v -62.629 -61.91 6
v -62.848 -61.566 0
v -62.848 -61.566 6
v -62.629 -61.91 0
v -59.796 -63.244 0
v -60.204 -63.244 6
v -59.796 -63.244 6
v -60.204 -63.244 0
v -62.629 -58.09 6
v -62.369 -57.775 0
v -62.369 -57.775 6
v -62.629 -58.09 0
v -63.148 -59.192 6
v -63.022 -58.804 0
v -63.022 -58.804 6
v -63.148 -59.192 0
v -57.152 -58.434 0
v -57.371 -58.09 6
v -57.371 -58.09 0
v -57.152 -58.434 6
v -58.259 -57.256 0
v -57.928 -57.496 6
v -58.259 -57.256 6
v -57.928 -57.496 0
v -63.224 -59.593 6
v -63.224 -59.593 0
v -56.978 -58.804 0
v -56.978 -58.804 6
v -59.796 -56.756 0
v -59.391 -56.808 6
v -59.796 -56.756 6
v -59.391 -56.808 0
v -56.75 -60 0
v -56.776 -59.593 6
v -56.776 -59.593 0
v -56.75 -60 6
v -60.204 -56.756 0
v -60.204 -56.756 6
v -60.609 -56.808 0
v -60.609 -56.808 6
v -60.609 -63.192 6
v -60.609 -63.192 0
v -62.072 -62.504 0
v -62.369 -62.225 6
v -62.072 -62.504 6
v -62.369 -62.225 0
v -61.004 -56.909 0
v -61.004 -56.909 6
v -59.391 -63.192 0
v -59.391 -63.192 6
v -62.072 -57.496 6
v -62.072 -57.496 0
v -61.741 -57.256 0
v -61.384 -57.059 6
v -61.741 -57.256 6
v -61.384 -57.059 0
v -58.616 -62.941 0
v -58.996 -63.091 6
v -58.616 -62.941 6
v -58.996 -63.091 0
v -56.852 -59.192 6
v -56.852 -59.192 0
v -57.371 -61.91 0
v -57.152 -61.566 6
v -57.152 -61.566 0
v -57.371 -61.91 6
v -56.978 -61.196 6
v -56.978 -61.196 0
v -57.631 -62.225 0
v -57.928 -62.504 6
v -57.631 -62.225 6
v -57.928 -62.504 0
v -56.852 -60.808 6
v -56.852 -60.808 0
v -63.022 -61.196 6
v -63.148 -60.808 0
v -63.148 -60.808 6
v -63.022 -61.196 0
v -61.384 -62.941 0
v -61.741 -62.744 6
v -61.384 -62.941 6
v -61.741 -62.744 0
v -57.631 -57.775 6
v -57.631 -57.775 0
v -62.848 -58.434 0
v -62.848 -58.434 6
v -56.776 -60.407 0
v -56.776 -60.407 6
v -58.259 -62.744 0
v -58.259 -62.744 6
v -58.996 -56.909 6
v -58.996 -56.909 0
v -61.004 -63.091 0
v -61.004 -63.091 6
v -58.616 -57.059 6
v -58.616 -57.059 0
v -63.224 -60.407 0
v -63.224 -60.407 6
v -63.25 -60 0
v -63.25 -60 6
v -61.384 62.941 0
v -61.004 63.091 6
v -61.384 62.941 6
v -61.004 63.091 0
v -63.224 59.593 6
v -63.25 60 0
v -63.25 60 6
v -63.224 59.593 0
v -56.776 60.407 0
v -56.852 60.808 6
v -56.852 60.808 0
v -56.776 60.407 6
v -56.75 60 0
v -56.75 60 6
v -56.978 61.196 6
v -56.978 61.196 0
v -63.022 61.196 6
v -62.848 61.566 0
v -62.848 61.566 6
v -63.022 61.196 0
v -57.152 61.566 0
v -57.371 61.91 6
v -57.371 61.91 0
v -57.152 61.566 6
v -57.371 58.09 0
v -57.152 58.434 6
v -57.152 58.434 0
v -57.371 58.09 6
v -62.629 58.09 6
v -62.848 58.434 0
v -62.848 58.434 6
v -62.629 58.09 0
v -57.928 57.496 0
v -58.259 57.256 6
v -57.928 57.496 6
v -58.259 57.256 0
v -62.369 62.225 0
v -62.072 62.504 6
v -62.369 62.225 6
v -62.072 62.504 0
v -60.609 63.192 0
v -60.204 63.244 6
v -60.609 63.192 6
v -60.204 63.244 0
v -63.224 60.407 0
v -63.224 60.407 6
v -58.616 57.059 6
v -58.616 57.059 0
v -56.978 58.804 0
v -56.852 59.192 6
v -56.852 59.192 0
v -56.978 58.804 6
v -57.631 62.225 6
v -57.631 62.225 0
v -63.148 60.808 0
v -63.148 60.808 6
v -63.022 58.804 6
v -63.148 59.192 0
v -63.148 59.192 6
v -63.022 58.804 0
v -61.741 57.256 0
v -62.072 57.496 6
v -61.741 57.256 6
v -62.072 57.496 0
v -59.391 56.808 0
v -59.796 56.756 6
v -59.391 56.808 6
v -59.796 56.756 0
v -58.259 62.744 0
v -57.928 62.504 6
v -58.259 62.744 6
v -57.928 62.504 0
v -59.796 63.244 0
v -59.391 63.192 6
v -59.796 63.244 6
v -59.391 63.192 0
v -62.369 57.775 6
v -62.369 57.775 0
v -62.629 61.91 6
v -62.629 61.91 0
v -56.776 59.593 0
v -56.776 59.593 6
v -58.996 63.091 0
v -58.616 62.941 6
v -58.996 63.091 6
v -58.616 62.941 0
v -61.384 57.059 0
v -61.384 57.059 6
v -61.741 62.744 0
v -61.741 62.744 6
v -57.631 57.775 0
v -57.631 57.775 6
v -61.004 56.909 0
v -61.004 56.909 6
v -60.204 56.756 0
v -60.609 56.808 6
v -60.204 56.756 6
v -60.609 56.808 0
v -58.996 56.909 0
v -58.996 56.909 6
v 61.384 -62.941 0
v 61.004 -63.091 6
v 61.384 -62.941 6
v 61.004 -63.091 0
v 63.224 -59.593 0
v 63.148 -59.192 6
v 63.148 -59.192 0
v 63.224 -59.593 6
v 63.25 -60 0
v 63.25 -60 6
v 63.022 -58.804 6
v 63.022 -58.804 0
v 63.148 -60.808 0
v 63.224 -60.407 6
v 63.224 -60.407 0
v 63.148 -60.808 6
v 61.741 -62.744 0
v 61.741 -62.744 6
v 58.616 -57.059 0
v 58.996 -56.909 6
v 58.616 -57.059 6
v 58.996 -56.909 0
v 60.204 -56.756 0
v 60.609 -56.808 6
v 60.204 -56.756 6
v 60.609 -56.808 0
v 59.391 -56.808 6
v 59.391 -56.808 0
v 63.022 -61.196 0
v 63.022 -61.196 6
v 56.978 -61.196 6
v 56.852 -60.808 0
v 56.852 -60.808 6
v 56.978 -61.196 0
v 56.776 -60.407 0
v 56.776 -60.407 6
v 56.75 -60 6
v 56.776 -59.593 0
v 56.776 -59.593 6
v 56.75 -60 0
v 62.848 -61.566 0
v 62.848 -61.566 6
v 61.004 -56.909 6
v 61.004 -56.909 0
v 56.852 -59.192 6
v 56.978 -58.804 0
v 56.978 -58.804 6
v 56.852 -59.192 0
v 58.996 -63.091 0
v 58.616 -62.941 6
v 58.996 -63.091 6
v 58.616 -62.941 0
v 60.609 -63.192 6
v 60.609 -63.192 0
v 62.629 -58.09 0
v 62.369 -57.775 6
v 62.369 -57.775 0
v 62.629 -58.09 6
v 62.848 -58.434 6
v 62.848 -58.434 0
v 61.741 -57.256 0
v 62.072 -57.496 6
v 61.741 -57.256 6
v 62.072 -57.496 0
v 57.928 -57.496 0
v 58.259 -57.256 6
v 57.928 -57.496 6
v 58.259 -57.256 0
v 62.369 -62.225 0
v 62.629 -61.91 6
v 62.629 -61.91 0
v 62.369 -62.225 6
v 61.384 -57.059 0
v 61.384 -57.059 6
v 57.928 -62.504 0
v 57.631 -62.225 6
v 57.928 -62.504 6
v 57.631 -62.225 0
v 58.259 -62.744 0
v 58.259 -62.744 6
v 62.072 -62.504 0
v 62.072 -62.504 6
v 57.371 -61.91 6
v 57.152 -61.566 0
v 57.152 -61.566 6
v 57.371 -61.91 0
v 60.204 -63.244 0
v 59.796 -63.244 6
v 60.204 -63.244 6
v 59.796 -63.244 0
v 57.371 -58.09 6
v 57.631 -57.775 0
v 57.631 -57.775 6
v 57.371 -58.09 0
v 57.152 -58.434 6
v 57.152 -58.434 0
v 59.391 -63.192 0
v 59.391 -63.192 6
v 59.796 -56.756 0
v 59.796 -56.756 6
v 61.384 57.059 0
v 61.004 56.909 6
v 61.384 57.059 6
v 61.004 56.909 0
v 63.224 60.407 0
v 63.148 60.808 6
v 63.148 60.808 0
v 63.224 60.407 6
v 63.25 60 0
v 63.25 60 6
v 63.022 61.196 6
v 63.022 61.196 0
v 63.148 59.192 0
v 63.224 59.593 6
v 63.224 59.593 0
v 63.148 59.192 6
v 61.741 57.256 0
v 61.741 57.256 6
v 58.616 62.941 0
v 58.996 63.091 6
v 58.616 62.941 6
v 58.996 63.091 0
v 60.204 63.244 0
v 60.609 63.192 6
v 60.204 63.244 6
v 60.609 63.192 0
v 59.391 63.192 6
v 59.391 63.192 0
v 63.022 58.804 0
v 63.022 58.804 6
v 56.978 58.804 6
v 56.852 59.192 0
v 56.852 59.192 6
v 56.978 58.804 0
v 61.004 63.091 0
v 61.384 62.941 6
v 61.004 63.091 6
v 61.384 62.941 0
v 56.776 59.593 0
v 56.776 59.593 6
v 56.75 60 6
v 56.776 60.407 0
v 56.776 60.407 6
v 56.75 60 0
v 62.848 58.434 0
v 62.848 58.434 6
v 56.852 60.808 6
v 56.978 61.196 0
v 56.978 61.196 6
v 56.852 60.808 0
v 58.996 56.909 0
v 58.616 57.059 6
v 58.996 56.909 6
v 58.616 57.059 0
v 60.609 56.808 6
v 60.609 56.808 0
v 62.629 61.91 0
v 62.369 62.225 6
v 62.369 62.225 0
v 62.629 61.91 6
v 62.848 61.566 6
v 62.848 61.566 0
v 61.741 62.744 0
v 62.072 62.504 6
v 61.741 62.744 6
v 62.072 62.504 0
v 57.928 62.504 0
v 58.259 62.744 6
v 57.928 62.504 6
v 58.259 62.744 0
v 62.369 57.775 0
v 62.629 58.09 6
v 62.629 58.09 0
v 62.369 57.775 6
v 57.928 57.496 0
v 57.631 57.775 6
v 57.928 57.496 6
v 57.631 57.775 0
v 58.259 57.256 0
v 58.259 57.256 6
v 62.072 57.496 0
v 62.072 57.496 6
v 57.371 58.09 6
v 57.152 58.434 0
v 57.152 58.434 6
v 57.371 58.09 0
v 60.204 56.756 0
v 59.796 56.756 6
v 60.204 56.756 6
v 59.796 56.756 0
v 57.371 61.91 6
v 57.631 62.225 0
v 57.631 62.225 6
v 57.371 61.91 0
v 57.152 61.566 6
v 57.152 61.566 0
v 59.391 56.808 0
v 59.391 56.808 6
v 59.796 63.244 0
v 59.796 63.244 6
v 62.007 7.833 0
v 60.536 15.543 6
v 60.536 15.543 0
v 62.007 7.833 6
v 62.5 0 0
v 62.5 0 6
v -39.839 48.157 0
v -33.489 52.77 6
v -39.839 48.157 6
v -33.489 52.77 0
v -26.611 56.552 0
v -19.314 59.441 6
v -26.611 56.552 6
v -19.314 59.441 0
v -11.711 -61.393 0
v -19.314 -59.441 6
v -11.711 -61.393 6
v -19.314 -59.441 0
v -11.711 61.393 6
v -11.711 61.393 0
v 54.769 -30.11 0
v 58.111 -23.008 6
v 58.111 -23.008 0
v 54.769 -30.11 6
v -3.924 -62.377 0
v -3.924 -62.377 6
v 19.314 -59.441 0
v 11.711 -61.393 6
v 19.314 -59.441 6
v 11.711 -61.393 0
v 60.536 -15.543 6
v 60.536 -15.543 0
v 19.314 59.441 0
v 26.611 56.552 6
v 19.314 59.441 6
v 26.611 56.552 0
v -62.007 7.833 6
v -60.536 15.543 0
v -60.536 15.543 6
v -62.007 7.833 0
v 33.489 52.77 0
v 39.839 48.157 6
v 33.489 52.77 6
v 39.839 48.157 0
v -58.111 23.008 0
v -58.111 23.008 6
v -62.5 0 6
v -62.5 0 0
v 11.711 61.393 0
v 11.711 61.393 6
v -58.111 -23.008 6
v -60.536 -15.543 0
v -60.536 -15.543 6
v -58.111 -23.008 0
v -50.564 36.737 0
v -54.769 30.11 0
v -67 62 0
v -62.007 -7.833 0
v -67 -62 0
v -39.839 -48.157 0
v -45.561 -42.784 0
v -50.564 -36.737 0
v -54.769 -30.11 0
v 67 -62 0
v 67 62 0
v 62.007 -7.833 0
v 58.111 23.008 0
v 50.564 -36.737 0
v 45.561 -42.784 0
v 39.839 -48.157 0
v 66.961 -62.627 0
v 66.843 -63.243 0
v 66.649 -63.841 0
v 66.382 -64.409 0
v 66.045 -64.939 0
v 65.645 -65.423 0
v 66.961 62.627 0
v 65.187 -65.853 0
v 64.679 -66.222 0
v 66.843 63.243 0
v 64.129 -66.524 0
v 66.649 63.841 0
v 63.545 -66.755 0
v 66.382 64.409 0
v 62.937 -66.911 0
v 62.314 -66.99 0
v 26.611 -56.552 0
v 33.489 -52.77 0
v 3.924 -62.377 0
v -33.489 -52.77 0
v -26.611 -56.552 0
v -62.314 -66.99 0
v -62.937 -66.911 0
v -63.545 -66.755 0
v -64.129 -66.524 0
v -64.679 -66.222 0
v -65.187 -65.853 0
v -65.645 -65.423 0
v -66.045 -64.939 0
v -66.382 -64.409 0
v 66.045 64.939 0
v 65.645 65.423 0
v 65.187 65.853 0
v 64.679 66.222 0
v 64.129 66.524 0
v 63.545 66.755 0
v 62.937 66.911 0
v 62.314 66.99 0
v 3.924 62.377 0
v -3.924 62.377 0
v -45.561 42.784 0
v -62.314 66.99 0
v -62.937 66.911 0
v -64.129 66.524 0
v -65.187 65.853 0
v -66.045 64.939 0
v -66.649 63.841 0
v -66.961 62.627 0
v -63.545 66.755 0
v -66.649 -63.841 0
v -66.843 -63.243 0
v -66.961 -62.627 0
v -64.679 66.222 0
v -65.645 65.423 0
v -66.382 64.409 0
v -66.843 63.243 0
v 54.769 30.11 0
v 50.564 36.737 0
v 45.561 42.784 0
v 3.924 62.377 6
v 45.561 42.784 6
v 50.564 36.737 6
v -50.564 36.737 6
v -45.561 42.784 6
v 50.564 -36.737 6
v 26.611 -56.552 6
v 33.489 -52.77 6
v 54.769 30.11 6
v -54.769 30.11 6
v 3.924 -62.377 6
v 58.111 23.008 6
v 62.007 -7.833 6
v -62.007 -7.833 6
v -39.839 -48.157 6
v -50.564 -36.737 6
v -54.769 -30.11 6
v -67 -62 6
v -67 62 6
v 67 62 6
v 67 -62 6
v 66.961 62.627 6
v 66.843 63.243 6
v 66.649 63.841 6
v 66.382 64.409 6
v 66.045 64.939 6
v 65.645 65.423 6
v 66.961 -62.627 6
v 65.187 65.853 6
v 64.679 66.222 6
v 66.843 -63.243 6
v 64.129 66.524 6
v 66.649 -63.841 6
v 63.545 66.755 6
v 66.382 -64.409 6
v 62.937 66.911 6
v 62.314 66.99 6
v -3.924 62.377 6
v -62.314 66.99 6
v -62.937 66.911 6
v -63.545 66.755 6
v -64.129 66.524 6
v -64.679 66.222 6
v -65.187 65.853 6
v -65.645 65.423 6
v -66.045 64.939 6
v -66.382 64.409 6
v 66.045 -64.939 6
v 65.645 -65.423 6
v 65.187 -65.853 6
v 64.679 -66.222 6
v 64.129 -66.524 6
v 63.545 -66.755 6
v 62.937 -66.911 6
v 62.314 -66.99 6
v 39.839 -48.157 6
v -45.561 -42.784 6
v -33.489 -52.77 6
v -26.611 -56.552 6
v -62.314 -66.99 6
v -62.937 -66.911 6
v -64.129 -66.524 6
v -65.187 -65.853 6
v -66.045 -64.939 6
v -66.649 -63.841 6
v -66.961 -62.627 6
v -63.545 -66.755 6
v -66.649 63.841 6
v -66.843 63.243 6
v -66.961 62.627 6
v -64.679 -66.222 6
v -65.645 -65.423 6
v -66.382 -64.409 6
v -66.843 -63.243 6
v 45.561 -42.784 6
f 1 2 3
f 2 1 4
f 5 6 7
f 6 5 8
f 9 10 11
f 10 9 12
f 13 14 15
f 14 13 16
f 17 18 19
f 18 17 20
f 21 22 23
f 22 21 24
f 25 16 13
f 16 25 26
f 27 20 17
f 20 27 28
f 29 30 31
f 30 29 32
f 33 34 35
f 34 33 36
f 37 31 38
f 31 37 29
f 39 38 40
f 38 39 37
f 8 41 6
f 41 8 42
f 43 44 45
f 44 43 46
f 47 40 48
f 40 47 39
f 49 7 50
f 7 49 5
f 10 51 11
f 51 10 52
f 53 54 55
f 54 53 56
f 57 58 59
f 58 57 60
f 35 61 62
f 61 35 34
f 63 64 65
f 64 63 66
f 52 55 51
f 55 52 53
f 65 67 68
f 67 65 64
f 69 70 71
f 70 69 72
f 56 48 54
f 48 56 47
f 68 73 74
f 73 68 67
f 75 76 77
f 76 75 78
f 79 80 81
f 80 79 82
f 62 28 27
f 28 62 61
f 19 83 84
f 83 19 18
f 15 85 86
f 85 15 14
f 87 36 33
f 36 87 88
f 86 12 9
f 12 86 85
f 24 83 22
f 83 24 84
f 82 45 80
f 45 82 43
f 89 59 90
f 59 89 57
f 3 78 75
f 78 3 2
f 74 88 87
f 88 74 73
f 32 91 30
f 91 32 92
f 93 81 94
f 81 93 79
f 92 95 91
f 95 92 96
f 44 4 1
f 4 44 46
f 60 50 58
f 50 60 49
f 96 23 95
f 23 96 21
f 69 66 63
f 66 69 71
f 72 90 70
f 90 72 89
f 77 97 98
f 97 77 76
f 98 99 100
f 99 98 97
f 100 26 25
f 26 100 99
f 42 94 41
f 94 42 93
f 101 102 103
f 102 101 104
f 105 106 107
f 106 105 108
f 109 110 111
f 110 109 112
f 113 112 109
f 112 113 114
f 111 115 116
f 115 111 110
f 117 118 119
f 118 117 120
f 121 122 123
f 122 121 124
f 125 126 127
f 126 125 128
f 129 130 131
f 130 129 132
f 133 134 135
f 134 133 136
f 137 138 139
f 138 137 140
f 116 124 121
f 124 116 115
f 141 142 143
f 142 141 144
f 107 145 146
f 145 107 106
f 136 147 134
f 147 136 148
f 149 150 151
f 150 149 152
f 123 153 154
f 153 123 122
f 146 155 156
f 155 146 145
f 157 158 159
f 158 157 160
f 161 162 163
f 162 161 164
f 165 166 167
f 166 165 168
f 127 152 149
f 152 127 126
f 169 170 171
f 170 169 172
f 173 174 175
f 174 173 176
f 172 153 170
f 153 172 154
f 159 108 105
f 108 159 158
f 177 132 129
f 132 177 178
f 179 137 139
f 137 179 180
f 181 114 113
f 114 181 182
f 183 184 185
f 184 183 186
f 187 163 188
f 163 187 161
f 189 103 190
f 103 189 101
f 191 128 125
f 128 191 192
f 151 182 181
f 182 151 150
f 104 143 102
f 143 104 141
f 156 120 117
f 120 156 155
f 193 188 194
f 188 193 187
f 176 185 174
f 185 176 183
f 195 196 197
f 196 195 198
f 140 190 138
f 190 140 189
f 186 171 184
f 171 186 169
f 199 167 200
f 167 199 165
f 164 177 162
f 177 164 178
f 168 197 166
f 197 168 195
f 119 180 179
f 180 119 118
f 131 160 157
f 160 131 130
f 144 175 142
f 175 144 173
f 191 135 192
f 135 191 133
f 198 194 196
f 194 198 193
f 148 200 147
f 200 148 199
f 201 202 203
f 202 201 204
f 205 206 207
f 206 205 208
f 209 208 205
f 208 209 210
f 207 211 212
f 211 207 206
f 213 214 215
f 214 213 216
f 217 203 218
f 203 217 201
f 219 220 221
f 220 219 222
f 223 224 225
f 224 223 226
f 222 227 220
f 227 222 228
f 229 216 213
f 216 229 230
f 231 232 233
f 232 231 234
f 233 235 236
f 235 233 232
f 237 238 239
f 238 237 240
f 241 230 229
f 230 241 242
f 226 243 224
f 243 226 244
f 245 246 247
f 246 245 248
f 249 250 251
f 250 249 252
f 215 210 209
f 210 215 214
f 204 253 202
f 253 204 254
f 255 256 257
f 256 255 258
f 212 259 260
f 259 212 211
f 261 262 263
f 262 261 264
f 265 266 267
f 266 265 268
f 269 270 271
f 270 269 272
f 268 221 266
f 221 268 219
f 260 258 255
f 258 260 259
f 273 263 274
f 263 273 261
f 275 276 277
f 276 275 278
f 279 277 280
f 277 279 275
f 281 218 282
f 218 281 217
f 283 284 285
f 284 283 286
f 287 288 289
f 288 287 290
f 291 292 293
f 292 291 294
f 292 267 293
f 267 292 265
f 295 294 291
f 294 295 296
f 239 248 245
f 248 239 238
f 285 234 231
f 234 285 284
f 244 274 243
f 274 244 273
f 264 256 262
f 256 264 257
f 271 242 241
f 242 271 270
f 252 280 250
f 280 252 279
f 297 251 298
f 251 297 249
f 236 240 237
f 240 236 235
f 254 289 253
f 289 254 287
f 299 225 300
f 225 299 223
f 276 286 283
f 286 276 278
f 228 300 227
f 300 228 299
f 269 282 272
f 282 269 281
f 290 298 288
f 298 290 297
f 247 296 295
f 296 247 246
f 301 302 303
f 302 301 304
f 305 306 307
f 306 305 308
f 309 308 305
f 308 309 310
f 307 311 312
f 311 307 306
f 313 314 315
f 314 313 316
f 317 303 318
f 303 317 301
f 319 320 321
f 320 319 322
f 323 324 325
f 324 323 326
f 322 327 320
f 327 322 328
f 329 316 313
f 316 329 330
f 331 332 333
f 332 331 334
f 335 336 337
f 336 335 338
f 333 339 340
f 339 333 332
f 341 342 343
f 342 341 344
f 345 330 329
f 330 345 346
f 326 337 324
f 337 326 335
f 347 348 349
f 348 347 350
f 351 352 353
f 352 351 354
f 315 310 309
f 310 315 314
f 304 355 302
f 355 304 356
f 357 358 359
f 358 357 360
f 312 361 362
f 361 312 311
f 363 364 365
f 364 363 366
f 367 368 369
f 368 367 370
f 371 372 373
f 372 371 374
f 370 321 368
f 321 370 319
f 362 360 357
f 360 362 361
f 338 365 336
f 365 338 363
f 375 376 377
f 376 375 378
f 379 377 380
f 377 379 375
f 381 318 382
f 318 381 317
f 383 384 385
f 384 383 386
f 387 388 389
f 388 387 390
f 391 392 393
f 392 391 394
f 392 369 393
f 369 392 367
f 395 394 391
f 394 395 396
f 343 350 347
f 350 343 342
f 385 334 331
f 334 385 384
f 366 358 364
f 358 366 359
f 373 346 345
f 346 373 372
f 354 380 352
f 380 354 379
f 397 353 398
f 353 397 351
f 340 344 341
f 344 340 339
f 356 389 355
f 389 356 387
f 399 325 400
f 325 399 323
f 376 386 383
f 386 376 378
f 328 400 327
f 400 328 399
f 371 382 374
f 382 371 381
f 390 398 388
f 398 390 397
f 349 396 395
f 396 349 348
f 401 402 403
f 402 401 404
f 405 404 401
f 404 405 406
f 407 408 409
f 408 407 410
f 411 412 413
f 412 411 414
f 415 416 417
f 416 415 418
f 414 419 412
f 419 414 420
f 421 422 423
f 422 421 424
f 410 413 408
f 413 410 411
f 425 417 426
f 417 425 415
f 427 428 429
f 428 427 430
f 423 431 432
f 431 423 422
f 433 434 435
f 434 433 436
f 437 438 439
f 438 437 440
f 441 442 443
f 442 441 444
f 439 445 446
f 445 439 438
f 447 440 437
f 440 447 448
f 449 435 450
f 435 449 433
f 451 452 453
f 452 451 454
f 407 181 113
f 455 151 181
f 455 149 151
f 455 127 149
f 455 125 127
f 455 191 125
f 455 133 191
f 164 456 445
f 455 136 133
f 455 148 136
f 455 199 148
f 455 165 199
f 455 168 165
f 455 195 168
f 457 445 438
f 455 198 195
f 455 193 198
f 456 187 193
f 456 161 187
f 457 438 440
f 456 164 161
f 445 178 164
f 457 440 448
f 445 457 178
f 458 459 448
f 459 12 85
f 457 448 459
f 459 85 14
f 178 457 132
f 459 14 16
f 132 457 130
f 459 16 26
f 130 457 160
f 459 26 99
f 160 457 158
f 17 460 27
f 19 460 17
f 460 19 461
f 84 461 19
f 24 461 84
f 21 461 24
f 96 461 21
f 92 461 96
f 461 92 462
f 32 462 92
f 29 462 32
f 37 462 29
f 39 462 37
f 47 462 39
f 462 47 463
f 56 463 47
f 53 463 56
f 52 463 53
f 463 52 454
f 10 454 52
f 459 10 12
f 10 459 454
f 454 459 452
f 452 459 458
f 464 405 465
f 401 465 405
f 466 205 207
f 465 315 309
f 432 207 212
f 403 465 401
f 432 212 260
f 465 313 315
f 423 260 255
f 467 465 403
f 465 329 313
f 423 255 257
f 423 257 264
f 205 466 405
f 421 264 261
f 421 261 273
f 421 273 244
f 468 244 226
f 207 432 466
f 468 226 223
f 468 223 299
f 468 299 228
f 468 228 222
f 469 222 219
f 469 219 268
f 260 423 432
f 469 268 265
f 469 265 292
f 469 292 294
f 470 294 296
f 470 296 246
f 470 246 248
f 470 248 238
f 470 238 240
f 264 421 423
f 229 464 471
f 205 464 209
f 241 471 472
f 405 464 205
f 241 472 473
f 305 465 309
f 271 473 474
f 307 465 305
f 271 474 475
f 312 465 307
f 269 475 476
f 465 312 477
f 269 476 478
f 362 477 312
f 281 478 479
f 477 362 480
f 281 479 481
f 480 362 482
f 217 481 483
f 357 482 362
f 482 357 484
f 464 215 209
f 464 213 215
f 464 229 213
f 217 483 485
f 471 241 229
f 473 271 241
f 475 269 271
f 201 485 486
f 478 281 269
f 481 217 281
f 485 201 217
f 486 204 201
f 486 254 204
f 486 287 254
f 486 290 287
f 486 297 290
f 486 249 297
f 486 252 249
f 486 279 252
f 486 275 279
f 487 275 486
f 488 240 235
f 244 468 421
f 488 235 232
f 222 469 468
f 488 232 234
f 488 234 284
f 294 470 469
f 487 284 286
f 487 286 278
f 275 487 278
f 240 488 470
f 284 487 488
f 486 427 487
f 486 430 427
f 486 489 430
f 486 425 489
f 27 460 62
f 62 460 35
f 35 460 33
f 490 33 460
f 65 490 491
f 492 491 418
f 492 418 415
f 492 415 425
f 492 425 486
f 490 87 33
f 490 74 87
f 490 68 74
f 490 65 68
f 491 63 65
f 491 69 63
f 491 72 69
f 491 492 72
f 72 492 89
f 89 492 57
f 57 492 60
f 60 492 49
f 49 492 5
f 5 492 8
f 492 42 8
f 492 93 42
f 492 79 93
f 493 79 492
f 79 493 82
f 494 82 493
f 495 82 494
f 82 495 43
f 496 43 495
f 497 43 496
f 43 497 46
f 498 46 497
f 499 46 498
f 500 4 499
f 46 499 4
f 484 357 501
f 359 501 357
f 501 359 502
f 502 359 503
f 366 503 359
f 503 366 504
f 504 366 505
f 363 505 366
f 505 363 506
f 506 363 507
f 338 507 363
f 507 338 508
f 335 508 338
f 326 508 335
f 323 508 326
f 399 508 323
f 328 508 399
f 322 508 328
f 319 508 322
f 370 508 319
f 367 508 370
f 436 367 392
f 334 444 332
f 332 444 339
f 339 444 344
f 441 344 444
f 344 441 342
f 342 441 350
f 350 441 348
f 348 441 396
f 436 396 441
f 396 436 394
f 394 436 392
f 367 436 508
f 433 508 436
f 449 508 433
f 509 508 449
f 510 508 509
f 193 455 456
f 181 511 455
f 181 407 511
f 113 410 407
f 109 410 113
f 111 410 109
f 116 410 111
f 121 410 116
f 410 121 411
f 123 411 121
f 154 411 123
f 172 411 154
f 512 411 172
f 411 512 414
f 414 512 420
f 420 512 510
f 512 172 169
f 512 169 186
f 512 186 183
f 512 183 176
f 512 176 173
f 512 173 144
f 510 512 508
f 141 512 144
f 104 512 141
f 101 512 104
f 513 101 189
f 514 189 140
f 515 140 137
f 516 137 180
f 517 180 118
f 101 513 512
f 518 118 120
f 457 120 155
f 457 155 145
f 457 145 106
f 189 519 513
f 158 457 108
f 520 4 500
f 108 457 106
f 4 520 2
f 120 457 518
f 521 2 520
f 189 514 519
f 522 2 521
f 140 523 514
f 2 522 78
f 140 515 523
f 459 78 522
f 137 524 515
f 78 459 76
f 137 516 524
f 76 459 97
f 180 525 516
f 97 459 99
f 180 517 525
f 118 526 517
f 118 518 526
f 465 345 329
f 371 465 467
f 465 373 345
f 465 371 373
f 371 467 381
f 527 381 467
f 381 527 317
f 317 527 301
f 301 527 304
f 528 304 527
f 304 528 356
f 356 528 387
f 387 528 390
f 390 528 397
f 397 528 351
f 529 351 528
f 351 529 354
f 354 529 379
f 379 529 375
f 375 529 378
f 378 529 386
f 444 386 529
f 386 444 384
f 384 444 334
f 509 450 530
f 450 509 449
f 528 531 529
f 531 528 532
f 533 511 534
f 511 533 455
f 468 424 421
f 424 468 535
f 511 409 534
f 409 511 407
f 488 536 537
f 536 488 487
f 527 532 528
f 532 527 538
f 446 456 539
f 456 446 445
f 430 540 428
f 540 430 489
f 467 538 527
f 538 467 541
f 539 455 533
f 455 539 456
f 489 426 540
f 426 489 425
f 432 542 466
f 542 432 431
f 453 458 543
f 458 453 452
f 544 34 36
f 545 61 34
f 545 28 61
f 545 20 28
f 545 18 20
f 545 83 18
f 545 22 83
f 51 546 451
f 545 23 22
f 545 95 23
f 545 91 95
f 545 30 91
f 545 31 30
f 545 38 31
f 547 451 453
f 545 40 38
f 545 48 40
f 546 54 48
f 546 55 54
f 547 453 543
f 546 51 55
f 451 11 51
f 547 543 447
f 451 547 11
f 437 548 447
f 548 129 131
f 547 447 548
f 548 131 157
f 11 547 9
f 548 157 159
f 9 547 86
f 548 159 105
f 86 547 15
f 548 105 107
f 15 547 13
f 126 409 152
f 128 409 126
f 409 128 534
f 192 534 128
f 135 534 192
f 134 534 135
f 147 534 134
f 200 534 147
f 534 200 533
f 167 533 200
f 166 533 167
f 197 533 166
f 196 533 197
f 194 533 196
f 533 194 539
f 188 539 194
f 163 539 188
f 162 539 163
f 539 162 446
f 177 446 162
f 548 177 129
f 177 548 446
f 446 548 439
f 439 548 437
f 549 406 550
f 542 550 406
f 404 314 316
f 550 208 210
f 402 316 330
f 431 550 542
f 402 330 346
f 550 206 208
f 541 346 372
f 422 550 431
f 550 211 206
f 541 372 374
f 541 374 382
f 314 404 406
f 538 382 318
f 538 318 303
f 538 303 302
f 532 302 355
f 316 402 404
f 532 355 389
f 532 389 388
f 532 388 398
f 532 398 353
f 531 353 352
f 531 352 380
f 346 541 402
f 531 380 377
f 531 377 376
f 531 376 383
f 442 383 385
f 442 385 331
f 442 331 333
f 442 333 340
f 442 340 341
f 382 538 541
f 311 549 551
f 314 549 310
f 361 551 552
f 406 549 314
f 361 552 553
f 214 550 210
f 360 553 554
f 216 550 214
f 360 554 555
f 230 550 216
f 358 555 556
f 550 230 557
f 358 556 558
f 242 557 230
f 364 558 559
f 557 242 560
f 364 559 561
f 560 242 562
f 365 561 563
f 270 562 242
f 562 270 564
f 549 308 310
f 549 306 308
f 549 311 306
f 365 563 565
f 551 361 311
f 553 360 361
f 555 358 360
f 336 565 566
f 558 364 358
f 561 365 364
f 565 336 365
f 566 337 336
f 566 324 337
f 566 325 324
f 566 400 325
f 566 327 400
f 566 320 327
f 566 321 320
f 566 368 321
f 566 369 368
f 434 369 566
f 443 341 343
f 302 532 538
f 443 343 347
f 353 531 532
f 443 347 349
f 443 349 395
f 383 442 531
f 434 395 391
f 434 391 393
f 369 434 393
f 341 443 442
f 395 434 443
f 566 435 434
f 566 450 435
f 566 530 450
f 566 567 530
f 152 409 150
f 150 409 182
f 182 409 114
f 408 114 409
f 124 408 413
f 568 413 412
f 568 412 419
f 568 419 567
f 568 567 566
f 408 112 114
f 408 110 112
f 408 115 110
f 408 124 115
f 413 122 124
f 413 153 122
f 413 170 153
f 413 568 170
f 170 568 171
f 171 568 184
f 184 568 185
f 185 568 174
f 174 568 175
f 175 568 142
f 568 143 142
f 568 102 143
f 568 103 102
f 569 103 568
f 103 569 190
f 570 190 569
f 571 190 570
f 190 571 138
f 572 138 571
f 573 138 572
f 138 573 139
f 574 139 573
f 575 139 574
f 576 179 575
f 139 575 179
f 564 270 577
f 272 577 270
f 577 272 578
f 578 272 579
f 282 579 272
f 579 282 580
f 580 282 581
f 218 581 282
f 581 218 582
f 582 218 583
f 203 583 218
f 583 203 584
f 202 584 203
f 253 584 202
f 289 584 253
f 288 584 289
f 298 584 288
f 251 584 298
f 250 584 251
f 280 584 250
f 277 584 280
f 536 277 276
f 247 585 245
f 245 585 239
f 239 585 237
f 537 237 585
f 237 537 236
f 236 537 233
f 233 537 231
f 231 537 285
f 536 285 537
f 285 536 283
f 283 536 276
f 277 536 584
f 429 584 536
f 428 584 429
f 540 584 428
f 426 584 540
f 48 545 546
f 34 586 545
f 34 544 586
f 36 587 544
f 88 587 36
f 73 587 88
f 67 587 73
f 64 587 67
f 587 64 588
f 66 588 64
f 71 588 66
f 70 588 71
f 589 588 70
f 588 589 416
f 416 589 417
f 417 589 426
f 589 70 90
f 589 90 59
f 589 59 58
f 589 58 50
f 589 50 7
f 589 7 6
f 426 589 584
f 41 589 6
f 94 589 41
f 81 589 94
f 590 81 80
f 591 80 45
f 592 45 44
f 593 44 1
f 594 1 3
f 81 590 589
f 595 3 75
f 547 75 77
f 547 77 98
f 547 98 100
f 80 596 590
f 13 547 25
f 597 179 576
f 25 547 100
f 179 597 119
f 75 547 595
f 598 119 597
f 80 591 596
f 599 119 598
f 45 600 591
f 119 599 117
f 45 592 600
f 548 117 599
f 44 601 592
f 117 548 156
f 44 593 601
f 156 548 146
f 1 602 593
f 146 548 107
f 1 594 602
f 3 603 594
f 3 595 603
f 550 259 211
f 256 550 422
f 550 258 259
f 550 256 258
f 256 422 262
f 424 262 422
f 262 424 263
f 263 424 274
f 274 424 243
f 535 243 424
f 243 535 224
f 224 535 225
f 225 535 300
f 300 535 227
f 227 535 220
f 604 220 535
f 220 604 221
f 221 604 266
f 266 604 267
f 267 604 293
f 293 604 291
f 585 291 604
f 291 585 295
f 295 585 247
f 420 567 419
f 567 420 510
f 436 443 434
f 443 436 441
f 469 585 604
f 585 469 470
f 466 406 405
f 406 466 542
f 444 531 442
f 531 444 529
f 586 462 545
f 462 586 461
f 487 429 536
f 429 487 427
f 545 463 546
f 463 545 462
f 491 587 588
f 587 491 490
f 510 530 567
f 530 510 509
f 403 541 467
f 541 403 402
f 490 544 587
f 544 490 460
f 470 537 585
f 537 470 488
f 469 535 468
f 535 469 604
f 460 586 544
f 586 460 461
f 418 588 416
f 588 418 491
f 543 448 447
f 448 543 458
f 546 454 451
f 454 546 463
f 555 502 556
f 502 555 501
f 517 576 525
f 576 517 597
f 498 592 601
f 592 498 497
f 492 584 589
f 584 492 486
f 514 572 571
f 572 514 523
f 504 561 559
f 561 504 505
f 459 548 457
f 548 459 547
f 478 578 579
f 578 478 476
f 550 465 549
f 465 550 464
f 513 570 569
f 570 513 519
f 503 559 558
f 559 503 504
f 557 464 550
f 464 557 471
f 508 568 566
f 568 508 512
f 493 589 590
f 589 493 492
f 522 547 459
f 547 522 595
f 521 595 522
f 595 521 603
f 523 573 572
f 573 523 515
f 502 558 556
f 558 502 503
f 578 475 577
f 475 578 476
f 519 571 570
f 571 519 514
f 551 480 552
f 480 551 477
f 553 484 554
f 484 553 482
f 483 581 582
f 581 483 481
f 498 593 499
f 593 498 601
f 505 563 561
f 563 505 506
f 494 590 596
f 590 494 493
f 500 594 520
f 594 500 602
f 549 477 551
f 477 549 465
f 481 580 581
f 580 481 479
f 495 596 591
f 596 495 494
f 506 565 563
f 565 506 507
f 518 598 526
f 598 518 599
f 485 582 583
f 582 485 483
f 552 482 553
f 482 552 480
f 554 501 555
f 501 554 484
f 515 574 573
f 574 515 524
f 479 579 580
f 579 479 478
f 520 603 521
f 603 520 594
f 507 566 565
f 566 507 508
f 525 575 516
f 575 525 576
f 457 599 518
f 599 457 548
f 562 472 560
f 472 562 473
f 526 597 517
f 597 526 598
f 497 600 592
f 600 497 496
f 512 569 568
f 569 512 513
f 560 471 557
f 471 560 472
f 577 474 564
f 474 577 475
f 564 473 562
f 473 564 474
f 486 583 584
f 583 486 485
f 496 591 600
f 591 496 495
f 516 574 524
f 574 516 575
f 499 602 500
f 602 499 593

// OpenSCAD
$fn = 50;


difference() {
	union() {
		hull() {
			translate(v = [-62.0000000000, 62.0000000000, 0]) {
				cylinder(h = 6, r = 5);
			}
			translate(v = [62.0000000000, 62.0000000000, 0]) {
				cylinder(h = 6, r = 5);
			}
			translate(v = [-62.0000000000, -62.0000000000, 0]) {
				cylinder(h = 6, r = 5);
			}
			translate(v = [62.0000000000, -62.0000000000, 0]) {
				cylinder(h = 6, r = 5);
			}
		}
	}
	union() {
		#translate(v = [-60.0000000000, -60.0000000000, -100.0000000000]) {
			cylinder(h = 200, r = 3.2500000000);
		}
		#translate(v = [-60.0000000000, 60.0000000000, -100.0000000000]) {
			cylinder(h = 200, r = 3.2500000000);
		}
		#translate(v = [60.0000000000, -60.0000000000, -100.0000000000]) {
			cylinder(h = 200, r = 3.2500000000);
		}
		#translate(v = [60.0000000000, 60.0000000000, -100.0000000000]) {
			cylinder(h = 200, r = 3.2500000000);
		}
		#cylinder(h = 6, r = 62.5000000000);
	}
}
